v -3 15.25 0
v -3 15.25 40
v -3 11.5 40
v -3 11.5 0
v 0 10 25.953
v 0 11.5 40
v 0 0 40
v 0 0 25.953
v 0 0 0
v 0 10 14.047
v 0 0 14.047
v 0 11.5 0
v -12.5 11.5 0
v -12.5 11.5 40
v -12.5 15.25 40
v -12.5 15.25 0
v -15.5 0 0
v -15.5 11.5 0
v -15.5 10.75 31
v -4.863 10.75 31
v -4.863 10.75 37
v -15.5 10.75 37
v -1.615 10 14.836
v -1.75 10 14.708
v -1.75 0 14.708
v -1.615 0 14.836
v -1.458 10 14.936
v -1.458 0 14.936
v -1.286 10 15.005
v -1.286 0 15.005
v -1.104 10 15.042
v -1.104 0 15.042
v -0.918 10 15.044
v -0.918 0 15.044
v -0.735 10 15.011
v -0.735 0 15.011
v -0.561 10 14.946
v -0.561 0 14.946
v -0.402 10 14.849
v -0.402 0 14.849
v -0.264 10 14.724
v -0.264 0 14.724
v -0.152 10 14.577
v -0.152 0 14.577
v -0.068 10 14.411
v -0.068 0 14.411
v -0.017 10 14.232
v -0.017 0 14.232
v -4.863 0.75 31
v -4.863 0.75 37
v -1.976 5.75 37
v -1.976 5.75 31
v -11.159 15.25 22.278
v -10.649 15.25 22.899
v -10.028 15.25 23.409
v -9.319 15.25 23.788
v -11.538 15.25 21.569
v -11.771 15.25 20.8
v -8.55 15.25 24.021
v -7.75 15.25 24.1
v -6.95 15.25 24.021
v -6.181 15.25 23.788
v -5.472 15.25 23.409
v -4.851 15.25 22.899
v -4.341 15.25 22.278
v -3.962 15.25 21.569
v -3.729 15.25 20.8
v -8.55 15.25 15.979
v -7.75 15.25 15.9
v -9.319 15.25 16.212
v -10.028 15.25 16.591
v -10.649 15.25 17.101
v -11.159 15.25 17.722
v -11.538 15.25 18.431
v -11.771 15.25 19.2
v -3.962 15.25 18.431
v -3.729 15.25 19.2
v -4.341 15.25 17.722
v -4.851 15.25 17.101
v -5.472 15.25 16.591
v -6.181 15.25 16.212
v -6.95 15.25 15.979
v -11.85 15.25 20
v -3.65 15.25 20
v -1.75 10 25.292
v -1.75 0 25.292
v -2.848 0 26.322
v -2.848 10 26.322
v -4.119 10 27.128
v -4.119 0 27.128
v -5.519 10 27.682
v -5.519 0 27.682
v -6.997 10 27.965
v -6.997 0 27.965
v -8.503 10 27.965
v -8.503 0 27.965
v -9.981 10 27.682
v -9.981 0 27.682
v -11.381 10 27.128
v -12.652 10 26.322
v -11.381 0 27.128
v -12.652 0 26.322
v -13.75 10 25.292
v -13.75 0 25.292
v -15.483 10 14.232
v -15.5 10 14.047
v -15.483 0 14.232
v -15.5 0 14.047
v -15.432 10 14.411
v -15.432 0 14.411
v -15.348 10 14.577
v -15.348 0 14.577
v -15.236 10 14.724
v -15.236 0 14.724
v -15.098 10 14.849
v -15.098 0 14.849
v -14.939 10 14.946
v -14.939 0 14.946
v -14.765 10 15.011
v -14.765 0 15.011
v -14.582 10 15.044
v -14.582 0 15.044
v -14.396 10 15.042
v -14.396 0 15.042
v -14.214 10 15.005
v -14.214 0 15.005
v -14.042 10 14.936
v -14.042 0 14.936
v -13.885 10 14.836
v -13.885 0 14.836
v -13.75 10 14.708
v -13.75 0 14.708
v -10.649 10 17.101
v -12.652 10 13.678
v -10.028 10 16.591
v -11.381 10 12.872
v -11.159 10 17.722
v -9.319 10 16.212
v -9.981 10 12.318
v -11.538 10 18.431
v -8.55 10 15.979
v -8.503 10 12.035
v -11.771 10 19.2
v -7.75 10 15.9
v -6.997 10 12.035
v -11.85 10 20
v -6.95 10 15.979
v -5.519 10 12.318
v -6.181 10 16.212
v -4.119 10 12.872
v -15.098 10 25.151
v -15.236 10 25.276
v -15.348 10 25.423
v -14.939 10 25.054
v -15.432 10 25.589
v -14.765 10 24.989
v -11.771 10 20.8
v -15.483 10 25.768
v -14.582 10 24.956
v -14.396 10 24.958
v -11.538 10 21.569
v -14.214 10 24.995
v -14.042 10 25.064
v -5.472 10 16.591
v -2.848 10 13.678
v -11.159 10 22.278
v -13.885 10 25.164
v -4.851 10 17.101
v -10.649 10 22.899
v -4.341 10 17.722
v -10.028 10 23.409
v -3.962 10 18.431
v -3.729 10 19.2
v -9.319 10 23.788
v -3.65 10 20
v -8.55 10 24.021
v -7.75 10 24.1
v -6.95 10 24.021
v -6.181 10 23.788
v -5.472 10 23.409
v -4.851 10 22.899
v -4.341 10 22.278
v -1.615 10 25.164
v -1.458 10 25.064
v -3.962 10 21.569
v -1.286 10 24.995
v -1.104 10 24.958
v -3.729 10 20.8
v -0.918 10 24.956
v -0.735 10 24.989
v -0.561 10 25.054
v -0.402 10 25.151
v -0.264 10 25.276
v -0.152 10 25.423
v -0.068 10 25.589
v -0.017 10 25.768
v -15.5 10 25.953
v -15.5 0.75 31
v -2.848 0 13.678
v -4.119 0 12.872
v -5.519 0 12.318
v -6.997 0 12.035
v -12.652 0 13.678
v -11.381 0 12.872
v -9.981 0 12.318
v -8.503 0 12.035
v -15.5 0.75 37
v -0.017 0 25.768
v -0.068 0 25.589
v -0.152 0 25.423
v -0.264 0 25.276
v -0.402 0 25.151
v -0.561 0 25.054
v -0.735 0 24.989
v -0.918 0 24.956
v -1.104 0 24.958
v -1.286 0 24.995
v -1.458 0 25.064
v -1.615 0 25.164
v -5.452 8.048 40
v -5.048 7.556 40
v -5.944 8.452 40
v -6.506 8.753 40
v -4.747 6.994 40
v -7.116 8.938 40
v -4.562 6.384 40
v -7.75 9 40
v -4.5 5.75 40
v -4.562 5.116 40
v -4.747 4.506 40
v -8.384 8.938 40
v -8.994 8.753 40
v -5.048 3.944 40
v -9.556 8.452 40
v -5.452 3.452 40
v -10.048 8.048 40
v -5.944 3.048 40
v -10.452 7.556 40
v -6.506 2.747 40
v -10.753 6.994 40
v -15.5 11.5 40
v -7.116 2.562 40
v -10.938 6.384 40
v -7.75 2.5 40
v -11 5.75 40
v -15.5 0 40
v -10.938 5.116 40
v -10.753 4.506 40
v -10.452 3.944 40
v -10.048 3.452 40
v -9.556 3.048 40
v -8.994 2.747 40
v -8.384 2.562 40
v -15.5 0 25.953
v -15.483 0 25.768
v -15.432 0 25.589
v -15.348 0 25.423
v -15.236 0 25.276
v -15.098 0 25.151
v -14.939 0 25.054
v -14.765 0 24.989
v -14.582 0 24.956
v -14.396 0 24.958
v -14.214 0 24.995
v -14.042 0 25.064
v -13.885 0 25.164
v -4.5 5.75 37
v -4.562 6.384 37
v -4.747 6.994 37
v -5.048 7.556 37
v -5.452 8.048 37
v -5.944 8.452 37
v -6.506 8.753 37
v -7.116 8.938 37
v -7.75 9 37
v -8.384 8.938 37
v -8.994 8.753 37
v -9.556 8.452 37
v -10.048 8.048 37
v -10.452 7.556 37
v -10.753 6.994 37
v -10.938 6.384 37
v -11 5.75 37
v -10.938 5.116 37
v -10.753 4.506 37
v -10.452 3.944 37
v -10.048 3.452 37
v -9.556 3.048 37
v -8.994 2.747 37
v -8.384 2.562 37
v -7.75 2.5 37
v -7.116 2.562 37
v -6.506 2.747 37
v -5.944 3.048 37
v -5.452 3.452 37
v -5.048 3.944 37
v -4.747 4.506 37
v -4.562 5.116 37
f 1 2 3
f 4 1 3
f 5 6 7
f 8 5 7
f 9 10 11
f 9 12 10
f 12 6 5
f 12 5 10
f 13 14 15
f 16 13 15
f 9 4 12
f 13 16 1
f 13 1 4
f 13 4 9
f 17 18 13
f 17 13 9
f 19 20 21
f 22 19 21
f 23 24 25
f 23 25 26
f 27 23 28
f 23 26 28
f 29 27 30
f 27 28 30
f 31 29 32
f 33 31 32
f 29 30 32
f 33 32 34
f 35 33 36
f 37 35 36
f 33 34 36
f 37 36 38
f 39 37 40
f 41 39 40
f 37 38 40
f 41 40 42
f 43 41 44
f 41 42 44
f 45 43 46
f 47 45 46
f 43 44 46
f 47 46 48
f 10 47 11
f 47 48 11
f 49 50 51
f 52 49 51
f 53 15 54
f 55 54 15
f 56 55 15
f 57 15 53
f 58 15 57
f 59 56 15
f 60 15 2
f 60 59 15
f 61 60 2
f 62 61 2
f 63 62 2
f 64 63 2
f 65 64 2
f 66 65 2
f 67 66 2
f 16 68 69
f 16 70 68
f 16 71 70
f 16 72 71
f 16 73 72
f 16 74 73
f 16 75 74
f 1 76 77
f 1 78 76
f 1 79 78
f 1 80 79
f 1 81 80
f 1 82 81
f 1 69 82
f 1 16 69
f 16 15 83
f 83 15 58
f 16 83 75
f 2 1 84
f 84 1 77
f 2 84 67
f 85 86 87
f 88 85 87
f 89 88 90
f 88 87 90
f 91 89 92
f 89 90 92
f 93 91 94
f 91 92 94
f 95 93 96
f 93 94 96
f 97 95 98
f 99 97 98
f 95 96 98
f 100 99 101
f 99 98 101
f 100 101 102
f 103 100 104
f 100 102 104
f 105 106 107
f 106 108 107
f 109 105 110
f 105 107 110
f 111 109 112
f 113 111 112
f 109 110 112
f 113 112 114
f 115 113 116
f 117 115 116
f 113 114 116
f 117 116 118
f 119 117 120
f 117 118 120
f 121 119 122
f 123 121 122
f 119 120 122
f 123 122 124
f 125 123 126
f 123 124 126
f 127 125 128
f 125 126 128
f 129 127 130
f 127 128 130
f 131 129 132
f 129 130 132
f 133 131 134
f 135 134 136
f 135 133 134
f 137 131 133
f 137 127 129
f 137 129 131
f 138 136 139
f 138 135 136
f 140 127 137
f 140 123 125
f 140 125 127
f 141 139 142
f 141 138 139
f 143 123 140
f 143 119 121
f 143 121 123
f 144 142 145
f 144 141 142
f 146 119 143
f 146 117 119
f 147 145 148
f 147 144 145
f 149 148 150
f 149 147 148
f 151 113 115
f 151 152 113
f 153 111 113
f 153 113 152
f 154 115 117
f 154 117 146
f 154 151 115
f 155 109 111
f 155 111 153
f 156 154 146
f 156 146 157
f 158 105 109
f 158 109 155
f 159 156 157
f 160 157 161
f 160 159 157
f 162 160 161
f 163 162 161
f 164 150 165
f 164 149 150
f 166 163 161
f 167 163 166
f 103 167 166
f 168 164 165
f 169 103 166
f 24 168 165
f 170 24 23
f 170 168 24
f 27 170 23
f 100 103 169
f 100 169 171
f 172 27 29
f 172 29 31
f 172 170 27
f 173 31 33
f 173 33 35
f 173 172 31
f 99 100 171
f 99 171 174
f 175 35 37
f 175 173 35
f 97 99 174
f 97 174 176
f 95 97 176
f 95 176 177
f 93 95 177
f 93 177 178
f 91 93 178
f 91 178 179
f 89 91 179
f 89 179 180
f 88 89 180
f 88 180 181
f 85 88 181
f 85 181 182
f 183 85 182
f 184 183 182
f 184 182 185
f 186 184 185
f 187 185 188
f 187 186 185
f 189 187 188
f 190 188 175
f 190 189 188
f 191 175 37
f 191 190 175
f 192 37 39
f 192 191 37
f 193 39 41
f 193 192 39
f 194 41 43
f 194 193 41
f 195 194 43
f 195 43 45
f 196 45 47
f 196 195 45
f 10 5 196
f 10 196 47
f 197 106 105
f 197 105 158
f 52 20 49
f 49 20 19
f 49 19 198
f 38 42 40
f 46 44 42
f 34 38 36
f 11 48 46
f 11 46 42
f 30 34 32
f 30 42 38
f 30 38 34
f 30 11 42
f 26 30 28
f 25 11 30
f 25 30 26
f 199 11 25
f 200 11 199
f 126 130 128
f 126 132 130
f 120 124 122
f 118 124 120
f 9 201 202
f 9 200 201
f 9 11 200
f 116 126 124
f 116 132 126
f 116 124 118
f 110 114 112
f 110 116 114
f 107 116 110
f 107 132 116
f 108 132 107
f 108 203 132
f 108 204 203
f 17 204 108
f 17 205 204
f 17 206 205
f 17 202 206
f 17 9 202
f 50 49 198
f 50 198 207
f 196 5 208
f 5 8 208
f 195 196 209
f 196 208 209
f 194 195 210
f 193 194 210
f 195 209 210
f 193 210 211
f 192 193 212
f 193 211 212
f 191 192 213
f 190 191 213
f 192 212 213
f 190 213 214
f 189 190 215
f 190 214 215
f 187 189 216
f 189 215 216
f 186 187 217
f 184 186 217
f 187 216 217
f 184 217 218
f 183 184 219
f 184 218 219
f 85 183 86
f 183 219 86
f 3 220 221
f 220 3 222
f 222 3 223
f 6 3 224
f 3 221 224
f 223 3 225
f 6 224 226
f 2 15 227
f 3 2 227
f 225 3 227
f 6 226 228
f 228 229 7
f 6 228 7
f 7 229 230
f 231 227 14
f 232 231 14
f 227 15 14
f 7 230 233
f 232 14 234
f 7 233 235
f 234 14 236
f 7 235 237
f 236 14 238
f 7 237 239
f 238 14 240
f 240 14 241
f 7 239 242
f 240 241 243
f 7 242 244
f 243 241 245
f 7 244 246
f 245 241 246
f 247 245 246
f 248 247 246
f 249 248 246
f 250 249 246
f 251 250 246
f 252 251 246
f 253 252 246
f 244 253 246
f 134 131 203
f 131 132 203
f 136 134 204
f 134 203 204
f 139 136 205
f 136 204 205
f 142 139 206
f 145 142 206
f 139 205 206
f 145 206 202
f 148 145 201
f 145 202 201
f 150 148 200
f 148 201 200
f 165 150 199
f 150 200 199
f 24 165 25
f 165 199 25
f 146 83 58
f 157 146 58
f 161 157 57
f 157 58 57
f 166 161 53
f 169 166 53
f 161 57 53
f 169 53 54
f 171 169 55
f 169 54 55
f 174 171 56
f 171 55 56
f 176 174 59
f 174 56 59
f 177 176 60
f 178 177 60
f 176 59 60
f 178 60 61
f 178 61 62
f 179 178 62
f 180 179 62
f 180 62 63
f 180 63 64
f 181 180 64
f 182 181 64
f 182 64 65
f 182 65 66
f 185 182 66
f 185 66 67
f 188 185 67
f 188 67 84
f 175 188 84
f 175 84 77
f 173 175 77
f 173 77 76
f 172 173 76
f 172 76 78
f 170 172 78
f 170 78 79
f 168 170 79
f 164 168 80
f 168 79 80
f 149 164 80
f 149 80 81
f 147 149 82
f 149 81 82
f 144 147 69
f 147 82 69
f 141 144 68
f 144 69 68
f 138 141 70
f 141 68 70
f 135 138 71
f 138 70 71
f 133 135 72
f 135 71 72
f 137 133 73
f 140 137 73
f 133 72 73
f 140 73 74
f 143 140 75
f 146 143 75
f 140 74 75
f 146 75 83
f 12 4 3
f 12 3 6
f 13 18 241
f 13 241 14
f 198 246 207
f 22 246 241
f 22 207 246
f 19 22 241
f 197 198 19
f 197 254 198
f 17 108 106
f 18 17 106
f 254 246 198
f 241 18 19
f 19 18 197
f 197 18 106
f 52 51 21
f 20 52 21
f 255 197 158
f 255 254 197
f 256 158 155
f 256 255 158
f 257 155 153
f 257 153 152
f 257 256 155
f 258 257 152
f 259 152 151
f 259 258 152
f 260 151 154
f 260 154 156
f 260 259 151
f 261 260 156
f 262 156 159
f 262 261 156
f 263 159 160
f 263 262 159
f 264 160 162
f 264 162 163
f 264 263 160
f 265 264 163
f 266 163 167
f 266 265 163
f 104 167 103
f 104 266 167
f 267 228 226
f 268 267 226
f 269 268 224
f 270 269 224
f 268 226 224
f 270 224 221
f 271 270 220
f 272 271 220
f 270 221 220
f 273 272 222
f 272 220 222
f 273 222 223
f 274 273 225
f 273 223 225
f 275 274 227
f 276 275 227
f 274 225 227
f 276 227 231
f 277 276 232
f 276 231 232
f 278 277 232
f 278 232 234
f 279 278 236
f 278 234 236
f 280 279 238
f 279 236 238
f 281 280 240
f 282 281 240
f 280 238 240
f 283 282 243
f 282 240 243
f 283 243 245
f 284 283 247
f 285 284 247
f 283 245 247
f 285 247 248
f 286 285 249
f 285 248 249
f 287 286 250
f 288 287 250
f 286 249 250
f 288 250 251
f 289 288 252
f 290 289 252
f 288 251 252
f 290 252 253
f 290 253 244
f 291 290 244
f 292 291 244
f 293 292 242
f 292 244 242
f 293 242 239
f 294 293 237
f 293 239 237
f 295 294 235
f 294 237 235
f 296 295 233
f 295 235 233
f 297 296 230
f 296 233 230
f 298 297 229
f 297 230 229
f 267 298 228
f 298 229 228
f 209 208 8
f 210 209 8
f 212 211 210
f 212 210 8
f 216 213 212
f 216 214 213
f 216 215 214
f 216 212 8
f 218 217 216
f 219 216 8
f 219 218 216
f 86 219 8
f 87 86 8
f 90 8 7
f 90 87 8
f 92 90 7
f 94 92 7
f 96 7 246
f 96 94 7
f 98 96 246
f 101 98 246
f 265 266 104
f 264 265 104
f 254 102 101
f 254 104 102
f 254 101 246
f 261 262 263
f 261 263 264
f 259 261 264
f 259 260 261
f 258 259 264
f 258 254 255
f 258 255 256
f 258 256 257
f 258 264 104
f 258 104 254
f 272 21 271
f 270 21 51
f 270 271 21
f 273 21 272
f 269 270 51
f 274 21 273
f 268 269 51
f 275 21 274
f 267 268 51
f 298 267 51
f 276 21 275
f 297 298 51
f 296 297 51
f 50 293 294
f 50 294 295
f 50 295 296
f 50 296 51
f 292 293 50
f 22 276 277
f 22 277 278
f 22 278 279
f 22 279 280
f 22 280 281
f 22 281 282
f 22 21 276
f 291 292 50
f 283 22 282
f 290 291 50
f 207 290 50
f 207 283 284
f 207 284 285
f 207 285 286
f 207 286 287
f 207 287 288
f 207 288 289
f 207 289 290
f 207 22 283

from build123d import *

# Parameters (mm, degrees)
BOSS_EXTRUDE1_DEPTH = 40
CUT_EXTRUDE1_REACH  = 17.25
SKETCH2_R           = 4.1
SKETCH3_R           = 8
CUT_EXTRUDE2_DEPTH  = 10
FILLET1_R           = 1
CUT_EXTRUDE3_DEPTH  = 6
CUT_EXTRUDE4_REACH  = 17.5
SKETCH6_W           = 10
SKETCH6_H           = 6
SKETCH4_R           = 3.25
CUT_EXTRUDE5_DEPTH  = 3


with BuildPart() as part:
    # Sketch1 → Boss-Extrude1 (new body)
    with BuildSketch(Plane(origin=(0, 0, 0), x_dir=(0, 1, 0), z_dir=(0, 0, 1))):
        Polygon((0, 0), (0, 15.5), (11.5, 15.5), (11.5, 12.5), (15.25, 12.5), (15.25, 3), (11.5, 3), (11.5, 0), align=None)
    extrude(amount=BOSS_EXTRUDE1_DEPTH)

    # Sketch2 → Cut-Extrude1 (cut, up to next)
    with BuildSketch(Plane(origin=(0, 15.25, 0), x_dir=(-1, 0, 0), z_dir=(0, 1, 0)), mode=Mode.PRIVATE) as cut_extrude1_sk1:
        with Locations((7.75, 20)):
            Circle(SKETCH2_R)
    cut_extrude1_tool1 = extrude(cut_extrude1_sk1.sketch, amount=-CUT_EXTRUDE1_REACH, mode=Mode.PRIVATE) & part.part
    add(cut_extrude1_tool1.solids().sort_by_distance((-7.75, 15.25, 20))[0], mode=Mode.SUBTRACT)

    # Sketch3 → Cut-Extrude2 (cut)
    with BuildSketch(Plane.XZ):
        with Locations((-7.75, 20)):
            Circle(SKETCH3_R)
    extrude(amount=-CUT_EXTRUDE2_DEPTH, mode=Mode.SUBTRACT)

    # Fillet1
    fillet1_edges = [part.edges().sort_by_distance(p)[0] for p in [
        (0, 5, 18.015686517),
        (-15.5, 5, 18.015686517),
        (0, 5, 21.984313483),
        (-15.5, 5, 21.984313483),
    ]]
    fillet(fillet1_edges, radius=FILLET1_R)

    # Sketch5 → Cut-Extrude3 (cut)
    with BuildSketch(Plane.XY.offset(37)):
        Polygon((-1.976497308, 5.75), (-4.863248654, 10.75), (-10.636751346, 10.75), (-13.523502692, 5.75), (-10.636751346, 0.75), (-4.863248654, 0.75), align=None)
    extrude(amount=-CUT_EXTRUDE3_DEPTH, mode=Mode.SUBTRACT)

    # Sketch6 → Cut-Extrude4 (cut, up to next)
    with BuildSketch(Plane(origin=(-15.5, 0, 0), x_dir=(0, -1, 0), z_dir=(-1, 0, 0)), mode=Mode.PRIVATE) as cut_extrude4_sk1:
        with Locations((-5.75, 34)):
            Rectangle(SKETCH6_W, SKETCH6_H)
    cut_extrude4_tool1 = extrude(cut_extrude4_sk1.sketch, amount=-CUT_EXTRUDE4_REACH, mode=Mode.PRIVATE) & part.part
    add(cut_extrude4_tool1.solids().sort_by_distance((-15.5, 5.75, 34))[0], mode=Mode.SUBTRACT)

    # Sketch4 → Cut-Extrude5 (cut)
    with BuildSketch(Plane.XY.offset(40)):
        with Locations((-7.75, 5.75)):
            Circle(SKETCH4_R)
    extrude(amount=-CUT_EXTRUDE5_DEPTH, mode=Mode.SUBTRACT)


solid = part.part
